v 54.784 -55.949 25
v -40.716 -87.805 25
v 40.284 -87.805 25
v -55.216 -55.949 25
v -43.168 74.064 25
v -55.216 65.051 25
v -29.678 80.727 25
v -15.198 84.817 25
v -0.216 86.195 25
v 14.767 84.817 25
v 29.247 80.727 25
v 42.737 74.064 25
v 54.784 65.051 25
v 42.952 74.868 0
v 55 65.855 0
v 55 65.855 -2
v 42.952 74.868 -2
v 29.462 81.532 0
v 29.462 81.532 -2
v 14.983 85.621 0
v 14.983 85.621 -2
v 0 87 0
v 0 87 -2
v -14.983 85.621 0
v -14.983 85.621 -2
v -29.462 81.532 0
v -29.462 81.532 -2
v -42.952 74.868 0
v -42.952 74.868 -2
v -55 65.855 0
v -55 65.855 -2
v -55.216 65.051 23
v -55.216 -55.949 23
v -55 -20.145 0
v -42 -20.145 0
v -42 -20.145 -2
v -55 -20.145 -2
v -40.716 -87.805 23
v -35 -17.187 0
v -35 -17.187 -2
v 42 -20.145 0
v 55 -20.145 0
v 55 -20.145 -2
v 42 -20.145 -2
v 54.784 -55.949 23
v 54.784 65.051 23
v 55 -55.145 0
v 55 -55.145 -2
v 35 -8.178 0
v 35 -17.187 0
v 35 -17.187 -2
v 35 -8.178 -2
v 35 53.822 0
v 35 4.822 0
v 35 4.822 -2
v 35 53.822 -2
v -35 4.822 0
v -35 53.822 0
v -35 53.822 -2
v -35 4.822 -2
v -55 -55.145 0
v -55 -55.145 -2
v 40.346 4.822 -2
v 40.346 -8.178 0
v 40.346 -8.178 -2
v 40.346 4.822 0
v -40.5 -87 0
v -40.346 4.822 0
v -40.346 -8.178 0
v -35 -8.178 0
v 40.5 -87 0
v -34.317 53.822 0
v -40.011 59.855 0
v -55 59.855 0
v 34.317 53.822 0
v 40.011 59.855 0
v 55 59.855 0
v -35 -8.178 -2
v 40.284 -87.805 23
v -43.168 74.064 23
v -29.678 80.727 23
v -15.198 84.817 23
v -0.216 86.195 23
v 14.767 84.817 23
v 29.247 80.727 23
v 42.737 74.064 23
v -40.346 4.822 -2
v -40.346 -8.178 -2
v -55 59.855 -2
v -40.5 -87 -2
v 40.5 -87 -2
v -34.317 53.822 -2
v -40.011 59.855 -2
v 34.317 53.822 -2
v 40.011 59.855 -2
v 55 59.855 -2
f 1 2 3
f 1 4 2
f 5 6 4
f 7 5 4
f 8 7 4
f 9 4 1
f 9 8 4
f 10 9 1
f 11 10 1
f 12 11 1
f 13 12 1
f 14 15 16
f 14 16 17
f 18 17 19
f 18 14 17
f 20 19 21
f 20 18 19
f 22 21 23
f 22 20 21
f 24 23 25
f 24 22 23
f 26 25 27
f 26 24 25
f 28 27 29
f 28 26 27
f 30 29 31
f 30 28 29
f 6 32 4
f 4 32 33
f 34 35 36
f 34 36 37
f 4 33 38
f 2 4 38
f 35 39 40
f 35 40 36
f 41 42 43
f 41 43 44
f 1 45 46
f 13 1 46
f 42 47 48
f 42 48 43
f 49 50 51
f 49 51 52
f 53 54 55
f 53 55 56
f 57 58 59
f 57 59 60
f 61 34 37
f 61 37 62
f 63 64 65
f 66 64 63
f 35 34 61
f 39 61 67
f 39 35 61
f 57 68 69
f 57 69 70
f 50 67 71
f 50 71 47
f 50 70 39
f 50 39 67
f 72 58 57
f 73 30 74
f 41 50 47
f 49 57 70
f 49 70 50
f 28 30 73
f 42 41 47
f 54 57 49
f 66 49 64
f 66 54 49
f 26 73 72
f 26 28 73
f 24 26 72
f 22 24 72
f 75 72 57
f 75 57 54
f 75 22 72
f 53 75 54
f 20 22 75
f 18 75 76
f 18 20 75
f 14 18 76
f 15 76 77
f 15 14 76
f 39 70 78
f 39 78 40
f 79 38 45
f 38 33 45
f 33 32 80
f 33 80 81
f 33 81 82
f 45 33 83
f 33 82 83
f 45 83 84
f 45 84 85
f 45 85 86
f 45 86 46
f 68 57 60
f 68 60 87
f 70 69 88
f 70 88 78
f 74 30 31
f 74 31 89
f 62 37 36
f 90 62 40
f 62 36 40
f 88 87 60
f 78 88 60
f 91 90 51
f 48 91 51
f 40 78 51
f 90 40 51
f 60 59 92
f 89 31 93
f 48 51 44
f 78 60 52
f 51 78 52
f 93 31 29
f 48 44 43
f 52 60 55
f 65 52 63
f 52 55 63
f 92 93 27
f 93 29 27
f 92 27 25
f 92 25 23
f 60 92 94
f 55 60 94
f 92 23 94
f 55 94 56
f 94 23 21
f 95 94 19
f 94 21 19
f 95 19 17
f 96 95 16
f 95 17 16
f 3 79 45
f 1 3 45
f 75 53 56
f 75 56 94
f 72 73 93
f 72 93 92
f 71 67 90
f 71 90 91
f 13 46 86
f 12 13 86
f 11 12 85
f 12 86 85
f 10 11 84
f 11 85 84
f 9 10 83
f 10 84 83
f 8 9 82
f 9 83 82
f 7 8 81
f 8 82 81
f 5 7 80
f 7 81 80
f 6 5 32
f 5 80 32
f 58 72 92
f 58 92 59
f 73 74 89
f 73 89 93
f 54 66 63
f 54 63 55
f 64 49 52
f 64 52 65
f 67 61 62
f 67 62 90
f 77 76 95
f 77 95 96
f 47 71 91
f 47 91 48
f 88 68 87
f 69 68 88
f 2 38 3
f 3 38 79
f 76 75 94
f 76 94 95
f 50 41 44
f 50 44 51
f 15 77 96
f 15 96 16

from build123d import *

# Parameters (mm, degrees)
F2_DEPTH = 25
F3_DEPTH = 23
F4_DEPTH = 2


with BuildPart() as f2:
    # F1 (on Top) → F2 (new body)
    with BuildSketch(Plane.XY):
        with BuildLine():
            Line((-40.715536, -87.804613), (-0.215536, -87.804613))
            Line((-0.215536, -87.804613), (40.284464, -87.804613))
            Line((40.284464, -87.804613), (54.784464, -55.949472))
            Line((54.784464, -55.949472), (54.784464, 65.050528))
            ThreePointArc((54.784464, 65.050528), (-0.215536, 86.195387), (-55.215536, 65.050528))
            Line((-55.215536, 65.050528), (-55.215536, -55.949472))
            Line((-55.215536, -55.949472), (-40.715536, -87.804613))
        make_face()
    extrude(amount=F2_DEPTH)

    # F1 (on Top) → F3 (cut)
    with BuildSketch(Plane.XY):
        with BuildLine():
            Line((-40.715536, -87.804613), (-0.215536, -87.804613))
            Line((-0.215536, -87.804613), (40.284464, -87.804613))
            Line((40.284464, -87.804613), (54.784464, -55.949472))
            Line((54.784464, -55.949472), (54.784464, 65.050528))
            ThreePointArc((54.784464, 65.050528), (-0.215536, 86.195387), (-55.215536, 65.050528))
            Line((-55.215536, 65.050528), (-55.215536, -55.949472))
            Line((-55.215536, -55.949472), (-40.715536, -87.804613))
        make_face()
    extrude(amount=F3_DEPTH, mode=Mode.SUBTRACT)


with BuildPart() as f4:
    # F0 (on Top) → F4 (new body)
    with BuildSketch(Plane.XY):
        with BuildLine():
            Line((-40.5, -87), (0, -87))
            Line((0, -87), (40.5, -87))
            Line((40.5, -87), (55, -55.144859))
            Line((55, -55.144859), (55, -20.144859))
            Line((55, -20.144859), (42, -20.144859))
            Line((42, -20.144859), (35, -17.186692))
            Line((35, -17.186692), (35, -8.178284))
            Line((35, -8.178284), (40.345572, -8.178284))
            Line((40.345572, -8.178284), (40.345572, 4.821716))
            Line((40.345572, 4.821716), (35, 4.821716))
            Line((35, 4.821716), (35, 53.821716))
            Line((35, 53.821716), (34.316558, 53.821716))
            Line((34.316558, 53.821716), (40.010627, 59.855141))
            Line((40.010627, 59.855141), (55, 59.855141))
            Line((55, 59.855141), (55, 65.855141))
            ThreePointArc((55, 65.855141), (0, 87), (-55, 65.855141))
            Line((-55, 65.855141), (-55, 59.855141))
            Line((-55, 59.855141), (-40.010627, 59.855141))
            Line((-40.010627, 59.855141), (-34.316558, 53.821716))
            Line((-34.316558, 53.821716), (-35, 53.821716))
            Line((-35, 53.821716), (-35, 4.821716))
            Line((-35, 4.821716), (-40.345572, 4.821716))
            Line((-40.345572, 4.821716), (-40.345572, -8.178284))
            Line((-40.345572, -8.178284), (-35, -8.178284))
            Line((-35, -8.178284), (-35, -17.186692))
            Line((-35, -17.186692), (-42, -20.144859))
            Line((-42, -20.144859), (-55, -20.144859))
            Line((-55, -20.144859), (-55, -55.144859))
            Line((-55, -55.144859), (-40.5, -87))
        make_face()
    extrude(amount=-F4_DEPTH)


solid = Compound([f2.part, f4.part])
